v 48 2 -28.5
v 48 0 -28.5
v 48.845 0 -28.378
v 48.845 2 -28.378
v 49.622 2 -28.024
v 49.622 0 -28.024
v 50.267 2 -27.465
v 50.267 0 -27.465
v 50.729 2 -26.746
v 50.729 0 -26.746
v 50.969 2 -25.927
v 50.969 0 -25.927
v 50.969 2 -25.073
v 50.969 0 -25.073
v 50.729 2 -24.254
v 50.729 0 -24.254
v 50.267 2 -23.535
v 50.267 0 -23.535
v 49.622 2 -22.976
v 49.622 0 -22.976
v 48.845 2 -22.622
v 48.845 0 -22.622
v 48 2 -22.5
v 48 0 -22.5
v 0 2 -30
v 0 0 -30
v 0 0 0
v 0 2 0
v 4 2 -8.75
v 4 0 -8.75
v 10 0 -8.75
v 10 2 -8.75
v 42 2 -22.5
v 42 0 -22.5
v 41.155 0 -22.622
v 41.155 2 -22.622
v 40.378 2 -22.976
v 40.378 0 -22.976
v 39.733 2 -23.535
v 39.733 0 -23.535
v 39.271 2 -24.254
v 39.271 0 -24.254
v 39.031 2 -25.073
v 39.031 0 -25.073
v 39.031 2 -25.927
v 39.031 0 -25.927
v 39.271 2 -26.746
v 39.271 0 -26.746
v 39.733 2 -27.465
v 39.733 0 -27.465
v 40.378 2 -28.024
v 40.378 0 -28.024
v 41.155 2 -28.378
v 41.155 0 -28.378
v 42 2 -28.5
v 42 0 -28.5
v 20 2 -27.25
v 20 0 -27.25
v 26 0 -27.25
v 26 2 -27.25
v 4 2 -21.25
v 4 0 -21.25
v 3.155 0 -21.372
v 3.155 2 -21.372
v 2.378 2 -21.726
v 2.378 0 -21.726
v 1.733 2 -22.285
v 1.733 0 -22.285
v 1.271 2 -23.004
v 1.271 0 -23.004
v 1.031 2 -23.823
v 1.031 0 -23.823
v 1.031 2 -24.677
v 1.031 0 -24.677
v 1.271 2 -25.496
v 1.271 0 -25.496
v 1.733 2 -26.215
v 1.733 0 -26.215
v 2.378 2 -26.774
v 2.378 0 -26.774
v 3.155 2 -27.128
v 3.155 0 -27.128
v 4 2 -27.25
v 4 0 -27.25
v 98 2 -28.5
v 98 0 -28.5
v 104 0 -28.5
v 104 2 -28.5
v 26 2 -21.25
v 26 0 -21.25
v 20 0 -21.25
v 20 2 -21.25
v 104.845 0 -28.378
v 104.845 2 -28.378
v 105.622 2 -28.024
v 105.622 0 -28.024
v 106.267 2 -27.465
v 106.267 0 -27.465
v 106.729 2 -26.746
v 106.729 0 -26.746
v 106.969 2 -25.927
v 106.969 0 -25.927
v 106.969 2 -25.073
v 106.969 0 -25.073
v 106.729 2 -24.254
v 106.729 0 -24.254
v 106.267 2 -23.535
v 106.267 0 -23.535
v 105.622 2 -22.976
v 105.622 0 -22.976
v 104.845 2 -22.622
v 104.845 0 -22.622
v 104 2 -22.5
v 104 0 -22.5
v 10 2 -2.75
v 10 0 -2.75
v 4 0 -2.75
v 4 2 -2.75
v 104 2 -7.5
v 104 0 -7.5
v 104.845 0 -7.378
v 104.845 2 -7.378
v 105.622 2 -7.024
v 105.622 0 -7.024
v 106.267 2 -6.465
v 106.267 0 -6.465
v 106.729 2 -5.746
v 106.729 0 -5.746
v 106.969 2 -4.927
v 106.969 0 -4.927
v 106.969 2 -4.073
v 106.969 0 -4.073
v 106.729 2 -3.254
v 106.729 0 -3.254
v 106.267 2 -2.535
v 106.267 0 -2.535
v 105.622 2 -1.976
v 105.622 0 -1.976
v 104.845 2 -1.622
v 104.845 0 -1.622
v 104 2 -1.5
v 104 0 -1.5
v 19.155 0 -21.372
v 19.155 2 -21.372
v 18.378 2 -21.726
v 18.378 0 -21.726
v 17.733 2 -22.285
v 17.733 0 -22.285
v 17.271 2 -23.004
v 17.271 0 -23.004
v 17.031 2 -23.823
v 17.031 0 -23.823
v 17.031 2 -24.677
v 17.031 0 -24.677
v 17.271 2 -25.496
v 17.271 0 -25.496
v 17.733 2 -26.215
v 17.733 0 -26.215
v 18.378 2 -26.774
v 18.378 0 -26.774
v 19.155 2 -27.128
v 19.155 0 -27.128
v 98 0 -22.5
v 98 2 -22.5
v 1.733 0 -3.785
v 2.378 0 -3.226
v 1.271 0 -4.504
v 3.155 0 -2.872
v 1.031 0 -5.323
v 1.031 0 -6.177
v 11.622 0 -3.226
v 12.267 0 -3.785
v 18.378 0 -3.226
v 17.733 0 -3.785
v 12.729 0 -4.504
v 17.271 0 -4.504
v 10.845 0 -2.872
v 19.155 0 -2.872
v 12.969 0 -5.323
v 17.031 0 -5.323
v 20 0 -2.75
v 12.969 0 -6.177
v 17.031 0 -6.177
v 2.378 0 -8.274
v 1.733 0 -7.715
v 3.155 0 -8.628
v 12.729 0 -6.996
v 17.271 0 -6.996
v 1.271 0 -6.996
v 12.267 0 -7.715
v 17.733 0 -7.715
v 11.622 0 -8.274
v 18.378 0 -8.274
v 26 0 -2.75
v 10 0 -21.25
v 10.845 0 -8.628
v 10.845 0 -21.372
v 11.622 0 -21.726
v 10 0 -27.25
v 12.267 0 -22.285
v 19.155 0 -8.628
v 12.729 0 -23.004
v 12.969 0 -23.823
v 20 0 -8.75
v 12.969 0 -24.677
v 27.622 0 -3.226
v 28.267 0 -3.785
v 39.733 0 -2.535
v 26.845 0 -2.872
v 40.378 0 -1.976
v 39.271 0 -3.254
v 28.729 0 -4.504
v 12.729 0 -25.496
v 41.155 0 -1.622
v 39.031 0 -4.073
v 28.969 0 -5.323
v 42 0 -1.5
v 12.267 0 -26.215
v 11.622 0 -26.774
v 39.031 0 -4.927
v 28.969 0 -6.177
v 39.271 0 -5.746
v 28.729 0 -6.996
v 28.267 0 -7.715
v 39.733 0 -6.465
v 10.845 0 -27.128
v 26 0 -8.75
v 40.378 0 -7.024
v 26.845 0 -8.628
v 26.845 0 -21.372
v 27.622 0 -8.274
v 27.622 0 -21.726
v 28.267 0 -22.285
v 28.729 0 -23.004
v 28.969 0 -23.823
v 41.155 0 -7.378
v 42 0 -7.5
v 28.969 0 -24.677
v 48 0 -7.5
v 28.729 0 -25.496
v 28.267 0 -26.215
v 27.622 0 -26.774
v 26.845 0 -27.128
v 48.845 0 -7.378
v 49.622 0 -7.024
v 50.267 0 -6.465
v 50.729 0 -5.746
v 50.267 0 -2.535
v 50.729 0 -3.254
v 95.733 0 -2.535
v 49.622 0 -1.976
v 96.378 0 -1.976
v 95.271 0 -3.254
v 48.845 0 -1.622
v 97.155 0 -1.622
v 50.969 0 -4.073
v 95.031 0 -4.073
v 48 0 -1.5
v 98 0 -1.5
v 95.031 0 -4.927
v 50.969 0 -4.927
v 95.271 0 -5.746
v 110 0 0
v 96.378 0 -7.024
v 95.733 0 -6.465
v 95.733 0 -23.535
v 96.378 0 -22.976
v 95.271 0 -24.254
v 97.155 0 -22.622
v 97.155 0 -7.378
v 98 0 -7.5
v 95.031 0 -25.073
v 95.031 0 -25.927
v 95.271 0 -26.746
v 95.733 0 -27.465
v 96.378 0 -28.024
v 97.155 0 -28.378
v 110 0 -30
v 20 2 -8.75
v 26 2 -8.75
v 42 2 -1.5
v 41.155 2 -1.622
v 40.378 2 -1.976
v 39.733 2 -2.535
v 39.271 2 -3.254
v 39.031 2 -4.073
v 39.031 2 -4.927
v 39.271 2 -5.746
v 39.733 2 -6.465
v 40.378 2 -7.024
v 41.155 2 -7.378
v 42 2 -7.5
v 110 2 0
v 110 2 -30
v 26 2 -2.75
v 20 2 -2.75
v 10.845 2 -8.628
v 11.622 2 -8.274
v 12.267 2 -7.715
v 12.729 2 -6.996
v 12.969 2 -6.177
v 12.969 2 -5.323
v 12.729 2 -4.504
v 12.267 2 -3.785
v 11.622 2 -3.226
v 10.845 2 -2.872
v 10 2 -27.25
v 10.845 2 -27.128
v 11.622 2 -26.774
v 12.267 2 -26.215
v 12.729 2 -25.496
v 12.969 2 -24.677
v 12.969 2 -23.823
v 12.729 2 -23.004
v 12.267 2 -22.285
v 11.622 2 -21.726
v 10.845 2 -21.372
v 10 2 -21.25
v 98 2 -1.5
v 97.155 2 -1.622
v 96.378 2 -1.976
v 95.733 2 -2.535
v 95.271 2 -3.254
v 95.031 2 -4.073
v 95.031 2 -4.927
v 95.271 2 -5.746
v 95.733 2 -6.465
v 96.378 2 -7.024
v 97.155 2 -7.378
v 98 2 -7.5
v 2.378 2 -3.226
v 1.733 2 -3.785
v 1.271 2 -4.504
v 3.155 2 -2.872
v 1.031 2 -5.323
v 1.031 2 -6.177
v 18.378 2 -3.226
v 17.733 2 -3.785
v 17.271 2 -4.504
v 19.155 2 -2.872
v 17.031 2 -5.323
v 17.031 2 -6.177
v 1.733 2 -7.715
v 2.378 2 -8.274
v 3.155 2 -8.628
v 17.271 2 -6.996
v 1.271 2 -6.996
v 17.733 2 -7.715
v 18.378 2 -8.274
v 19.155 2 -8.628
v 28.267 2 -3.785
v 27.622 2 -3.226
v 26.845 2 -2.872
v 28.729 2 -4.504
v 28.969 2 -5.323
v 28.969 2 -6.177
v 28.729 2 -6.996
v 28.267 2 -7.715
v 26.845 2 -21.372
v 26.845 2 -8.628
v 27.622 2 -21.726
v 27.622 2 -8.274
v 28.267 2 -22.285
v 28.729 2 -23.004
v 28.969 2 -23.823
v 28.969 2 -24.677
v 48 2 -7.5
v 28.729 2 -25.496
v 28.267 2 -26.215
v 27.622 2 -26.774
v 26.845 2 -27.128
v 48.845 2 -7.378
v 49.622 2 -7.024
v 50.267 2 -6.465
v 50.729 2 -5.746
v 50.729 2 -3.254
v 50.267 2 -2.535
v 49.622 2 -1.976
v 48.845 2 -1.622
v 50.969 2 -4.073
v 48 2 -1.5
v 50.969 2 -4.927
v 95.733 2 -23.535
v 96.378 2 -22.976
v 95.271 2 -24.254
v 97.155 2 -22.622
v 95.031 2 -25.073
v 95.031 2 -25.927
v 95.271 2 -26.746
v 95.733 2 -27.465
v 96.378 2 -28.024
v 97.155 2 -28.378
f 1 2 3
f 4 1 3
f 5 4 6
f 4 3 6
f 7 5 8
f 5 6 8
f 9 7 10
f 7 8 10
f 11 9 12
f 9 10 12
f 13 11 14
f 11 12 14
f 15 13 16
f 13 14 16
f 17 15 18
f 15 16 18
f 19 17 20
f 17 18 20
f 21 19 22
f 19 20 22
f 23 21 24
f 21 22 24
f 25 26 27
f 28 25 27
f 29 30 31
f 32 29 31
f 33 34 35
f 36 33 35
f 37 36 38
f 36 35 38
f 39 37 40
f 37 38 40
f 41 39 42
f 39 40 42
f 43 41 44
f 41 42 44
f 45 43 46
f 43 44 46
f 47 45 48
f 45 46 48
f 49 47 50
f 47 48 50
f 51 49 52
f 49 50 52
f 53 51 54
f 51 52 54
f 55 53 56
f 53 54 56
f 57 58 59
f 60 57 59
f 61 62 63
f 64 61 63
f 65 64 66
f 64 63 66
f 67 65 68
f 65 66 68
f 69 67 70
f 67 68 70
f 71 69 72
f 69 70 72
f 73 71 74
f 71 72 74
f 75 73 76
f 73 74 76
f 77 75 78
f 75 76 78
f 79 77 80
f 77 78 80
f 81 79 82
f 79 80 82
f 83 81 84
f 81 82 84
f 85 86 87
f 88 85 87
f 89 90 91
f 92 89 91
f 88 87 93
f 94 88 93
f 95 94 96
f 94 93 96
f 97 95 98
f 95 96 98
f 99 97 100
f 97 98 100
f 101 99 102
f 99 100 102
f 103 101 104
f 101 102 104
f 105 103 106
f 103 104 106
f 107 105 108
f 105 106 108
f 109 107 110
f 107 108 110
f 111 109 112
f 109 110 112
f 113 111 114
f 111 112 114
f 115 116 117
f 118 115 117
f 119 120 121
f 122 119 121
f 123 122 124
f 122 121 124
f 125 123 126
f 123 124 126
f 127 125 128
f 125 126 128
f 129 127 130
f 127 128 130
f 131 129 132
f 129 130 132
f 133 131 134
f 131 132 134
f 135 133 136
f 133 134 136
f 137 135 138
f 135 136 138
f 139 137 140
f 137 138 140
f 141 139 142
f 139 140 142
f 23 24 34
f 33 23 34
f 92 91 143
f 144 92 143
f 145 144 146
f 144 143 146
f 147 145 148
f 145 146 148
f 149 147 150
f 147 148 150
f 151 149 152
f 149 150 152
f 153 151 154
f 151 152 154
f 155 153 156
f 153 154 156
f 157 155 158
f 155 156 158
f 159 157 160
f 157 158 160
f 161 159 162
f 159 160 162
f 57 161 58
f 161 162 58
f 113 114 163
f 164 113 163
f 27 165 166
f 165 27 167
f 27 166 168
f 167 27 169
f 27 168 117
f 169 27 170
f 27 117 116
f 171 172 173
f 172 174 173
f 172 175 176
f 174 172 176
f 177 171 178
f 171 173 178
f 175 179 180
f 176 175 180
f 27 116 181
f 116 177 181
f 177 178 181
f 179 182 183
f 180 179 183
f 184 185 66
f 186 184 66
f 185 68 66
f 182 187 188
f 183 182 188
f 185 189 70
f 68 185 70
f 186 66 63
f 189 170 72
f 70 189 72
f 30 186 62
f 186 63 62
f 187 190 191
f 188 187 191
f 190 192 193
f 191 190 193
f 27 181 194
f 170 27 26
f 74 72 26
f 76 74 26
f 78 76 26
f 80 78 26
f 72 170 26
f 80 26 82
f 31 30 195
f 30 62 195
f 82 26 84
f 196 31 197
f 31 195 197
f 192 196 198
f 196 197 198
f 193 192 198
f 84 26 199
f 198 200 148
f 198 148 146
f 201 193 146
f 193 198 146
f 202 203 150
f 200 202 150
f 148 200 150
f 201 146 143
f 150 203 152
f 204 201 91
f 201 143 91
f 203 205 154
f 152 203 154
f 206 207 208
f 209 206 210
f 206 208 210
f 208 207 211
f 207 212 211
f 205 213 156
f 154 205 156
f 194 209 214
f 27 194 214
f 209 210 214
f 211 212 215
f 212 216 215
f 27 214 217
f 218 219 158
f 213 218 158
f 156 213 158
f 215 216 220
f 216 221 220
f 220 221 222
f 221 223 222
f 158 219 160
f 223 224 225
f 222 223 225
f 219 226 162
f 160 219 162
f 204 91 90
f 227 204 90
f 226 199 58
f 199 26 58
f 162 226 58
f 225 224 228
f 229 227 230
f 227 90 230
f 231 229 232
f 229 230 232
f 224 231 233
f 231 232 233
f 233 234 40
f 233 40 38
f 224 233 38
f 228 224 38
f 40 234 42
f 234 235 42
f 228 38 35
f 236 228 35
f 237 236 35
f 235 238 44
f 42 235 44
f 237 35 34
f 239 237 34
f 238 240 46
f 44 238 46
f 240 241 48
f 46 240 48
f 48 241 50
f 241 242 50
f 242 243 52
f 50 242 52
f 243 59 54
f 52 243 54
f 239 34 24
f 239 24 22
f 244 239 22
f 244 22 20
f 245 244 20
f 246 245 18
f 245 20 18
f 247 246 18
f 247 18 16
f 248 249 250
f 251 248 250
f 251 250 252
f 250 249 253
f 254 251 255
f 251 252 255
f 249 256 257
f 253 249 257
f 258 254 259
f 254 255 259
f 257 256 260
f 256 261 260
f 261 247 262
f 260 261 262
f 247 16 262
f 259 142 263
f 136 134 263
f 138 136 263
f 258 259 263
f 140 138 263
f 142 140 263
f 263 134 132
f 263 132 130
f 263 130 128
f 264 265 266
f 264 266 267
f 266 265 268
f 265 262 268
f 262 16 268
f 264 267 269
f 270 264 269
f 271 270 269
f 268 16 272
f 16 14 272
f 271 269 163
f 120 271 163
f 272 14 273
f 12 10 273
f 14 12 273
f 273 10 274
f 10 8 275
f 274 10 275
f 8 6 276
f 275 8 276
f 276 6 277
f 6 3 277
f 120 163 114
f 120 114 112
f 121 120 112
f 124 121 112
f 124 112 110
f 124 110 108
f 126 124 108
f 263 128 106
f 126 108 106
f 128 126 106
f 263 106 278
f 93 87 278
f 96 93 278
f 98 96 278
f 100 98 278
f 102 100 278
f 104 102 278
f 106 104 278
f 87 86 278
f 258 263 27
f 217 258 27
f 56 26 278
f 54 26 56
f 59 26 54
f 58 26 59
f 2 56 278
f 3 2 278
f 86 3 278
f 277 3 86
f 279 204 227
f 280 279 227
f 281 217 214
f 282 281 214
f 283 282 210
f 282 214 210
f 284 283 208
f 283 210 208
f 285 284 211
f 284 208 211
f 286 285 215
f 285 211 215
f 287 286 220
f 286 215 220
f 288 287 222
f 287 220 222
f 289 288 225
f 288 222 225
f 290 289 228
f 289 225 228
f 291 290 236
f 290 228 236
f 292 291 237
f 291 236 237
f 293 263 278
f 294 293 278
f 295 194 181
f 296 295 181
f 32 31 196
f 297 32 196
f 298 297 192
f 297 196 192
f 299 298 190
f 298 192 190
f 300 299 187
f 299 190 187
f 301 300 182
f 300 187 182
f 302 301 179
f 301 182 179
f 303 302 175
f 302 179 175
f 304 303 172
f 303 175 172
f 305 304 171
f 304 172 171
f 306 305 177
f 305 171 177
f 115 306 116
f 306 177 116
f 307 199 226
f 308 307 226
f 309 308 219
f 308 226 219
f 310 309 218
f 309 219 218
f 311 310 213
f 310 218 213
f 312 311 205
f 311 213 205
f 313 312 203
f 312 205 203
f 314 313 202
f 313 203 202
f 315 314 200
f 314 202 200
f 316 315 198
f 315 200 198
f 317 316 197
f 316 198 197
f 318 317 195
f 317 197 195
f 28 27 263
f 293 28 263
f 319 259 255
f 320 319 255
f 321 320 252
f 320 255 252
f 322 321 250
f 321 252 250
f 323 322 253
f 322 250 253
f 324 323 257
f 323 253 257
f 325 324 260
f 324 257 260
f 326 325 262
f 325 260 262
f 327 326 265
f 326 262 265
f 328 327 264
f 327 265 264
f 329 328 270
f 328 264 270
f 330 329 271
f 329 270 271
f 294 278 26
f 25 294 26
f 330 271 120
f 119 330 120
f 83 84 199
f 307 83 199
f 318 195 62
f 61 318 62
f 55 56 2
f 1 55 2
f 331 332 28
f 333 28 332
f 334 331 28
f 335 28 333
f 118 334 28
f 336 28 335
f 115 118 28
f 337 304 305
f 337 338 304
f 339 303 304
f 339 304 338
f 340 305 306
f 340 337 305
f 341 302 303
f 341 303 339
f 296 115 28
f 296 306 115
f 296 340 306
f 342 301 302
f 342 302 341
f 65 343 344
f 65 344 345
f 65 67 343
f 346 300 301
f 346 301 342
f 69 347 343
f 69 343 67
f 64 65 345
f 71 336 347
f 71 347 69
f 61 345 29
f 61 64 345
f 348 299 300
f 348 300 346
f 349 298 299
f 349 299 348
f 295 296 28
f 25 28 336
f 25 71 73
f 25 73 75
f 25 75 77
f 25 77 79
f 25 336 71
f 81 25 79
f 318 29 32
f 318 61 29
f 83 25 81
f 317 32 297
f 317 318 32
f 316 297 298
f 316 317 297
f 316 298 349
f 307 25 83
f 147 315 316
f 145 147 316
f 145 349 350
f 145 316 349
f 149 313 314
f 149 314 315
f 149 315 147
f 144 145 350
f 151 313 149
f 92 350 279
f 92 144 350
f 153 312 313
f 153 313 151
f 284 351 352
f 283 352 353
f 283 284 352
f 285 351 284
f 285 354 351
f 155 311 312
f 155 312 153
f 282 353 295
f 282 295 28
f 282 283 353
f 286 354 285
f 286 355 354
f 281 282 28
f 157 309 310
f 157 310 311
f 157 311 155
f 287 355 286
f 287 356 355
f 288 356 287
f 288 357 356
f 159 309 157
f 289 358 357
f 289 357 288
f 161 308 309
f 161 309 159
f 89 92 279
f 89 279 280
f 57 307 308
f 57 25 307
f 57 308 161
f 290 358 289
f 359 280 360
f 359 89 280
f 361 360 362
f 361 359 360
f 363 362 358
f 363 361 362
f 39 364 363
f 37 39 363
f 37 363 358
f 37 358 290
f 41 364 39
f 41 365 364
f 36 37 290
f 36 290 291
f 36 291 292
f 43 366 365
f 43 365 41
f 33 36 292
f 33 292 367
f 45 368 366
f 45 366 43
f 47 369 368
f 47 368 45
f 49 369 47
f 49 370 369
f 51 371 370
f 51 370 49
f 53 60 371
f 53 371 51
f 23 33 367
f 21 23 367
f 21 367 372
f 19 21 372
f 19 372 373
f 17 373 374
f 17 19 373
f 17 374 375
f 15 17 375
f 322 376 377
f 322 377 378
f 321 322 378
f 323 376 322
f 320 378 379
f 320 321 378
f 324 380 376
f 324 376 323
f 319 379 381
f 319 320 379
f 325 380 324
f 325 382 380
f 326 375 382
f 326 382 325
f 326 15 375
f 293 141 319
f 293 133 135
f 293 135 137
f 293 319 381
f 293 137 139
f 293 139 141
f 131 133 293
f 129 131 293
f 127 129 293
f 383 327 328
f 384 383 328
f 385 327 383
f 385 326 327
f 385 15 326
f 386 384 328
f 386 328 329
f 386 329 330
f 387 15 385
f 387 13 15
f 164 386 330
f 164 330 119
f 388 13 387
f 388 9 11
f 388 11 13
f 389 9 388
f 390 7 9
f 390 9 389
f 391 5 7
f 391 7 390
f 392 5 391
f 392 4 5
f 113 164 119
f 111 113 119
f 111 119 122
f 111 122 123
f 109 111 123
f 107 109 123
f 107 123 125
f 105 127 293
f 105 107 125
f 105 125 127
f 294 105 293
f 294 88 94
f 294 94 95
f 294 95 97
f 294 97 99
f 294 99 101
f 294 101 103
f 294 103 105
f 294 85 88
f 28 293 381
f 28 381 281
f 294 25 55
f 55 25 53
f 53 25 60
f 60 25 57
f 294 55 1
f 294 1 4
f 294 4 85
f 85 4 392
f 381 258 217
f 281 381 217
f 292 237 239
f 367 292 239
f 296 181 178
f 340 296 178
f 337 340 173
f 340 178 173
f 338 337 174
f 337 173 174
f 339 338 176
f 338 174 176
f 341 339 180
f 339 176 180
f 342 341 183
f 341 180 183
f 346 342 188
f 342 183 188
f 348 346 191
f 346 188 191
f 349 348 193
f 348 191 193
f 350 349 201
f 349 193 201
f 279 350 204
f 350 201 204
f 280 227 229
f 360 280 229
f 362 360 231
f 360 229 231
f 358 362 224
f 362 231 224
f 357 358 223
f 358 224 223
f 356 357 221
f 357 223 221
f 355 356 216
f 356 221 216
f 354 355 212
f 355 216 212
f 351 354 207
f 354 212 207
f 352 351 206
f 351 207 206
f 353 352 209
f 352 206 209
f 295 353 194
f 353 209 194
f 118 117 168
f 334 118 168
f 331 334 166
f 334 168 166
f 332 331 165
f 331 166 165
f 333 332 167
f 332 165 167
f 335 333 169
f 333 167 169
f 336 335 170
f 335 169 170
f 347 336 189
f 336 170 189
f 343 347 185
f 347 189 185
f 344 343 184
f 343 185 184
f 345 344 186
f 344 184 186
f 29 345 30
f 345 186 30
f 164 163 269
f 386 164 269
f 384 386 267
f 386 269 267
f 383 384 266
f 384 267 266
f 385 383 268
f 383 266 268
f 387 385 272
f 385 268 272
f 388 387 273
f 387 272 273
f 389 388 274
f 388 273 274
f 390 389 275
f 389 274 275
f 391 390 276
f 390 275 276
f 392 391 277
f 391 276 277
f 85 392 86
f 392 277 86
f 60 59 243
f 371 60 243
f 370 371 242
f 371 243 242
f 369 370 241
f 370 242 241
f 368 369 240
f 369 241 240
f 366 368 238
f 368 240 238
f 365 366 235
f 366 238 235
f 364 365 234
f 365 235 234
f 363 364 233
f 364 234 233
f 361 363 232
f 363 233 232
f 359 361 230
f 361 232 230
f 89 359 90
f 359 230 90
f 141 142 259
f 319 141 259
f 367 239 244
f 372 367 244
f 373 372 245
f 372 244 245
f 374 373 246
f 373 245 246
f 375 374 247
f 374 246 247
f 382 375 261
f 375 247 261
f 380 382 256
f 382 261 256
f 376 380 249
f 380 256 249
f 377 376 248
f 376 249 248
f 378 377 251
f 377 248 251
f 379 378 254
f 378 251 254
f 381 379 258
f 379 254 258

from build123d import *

# Parameters (mm, degrees)
EXTRUDE_1_DEPTH = 2


with BuildPart() as part:
    # 草图1 → 凸台-拉伸1 (new body)
    with BuildSketch(Plane(origin=(0, 0, 0), x_dir=(1, 0, 0), z_dir=(0, 1, 0))):
        Polygon((0, 5.75), (0, 0), (110, 0), (110, 30), (0, 30), (0, 15), align=None)
        with BuildLine():
            ThreePointArc((4, 2.75), (1, 5.75), (4, 8.75))
            Line((4, 8.75), (10, 8.75))
            ThreePointArc((10, 8.75), (13, 5.75), (10, 2.75))
            Line((10, 2.75), (4, 2.75))
        make_face(mode=Mode.SUBTRACT)
        with BuildLine():
            ThreePointArc((20, 2.75), (17, 5.75), (20, 8.75))
            Line((20, 8.75), (26, 8.75))
            ThreePointArc((26, 8.75), (29, 5.75), (26, 2.75))
            Line((26, 2.75), (20, 2.75))
        make_face(mode=Mode.SUBTRACT)
        with BuildLine():
            ThreePointArc((42, 1.5), (39, 4.5), (42, 7.5))
            Line((42, 7.5), (48, 7.5))
            ThreePointArc((48, 7.5), (51, 4.5), (48, 1.5))
            Line((48, 1.5), (42, 1.5))
        make_face(mode=Mode.SUBTRACT)
        with BuildLine():
            ThreePointArc((98, 1.5), (95, 4.5), (98, 7.5))
            Line((98, 7.5), (104, 7.5))
            ThreePointArc((104, 7.5), (107, 4.5), (104, 1.5))
            Line((104, 1.5), (98, 1.5))
        make_face(mode=Mode.SUBTRACT)
        with BuildLine():
            Line((10, 21.25), (4, 21.25))
            ThreePointArc((4, 21.25), (1, 24.25), (4, 27.25))
            Line((4, 27.25), (10, 27.25))
            ThreePointArc((10, 27.25), (13, 24.25), (10, 21.25))
        make_face(mode=Mode.SUBTRACT)
        with BuildLine():
            Line((26, 21.25), (20, 21.25))
            ThreePointArc((20, 21.25), (17, 24.25), (20, 27.25))
            Line((20, 27.25), (26, 27.25))
            ThreePointArc((26, 27.25), (29, 24.25), (26, 21.25))
        make_face(mode=Mode.SUBTRACT)
        with BuildLine():
            Line((48, 22.5), (42, 22.5))
            ThreePointArc((42, 22.5), (39, 25.5), (42, 28.5))
            Line((42, 28.5), (48, 28.5))
            ThreePointArc((48, 28.5), (51, 25.5), (48, 22.5))
        make_face(mode=Mode.SUBTRACT)
        with BuildLine():
            Line((104, 22.5), (98, 22.5))
            ThreePointArc((98, 22.5), (95, 25.5), (98, 28.5))
            Line((98, 28.5), (104, 28.5))
            ThreePointArc((104, 28.5), (107, 25.5), (104, 22.5))
        make_face(mode=Mode.SUBTRACT)
    extrude(amount=EXTRUDE_1_DEPTH)


solid = part.part
